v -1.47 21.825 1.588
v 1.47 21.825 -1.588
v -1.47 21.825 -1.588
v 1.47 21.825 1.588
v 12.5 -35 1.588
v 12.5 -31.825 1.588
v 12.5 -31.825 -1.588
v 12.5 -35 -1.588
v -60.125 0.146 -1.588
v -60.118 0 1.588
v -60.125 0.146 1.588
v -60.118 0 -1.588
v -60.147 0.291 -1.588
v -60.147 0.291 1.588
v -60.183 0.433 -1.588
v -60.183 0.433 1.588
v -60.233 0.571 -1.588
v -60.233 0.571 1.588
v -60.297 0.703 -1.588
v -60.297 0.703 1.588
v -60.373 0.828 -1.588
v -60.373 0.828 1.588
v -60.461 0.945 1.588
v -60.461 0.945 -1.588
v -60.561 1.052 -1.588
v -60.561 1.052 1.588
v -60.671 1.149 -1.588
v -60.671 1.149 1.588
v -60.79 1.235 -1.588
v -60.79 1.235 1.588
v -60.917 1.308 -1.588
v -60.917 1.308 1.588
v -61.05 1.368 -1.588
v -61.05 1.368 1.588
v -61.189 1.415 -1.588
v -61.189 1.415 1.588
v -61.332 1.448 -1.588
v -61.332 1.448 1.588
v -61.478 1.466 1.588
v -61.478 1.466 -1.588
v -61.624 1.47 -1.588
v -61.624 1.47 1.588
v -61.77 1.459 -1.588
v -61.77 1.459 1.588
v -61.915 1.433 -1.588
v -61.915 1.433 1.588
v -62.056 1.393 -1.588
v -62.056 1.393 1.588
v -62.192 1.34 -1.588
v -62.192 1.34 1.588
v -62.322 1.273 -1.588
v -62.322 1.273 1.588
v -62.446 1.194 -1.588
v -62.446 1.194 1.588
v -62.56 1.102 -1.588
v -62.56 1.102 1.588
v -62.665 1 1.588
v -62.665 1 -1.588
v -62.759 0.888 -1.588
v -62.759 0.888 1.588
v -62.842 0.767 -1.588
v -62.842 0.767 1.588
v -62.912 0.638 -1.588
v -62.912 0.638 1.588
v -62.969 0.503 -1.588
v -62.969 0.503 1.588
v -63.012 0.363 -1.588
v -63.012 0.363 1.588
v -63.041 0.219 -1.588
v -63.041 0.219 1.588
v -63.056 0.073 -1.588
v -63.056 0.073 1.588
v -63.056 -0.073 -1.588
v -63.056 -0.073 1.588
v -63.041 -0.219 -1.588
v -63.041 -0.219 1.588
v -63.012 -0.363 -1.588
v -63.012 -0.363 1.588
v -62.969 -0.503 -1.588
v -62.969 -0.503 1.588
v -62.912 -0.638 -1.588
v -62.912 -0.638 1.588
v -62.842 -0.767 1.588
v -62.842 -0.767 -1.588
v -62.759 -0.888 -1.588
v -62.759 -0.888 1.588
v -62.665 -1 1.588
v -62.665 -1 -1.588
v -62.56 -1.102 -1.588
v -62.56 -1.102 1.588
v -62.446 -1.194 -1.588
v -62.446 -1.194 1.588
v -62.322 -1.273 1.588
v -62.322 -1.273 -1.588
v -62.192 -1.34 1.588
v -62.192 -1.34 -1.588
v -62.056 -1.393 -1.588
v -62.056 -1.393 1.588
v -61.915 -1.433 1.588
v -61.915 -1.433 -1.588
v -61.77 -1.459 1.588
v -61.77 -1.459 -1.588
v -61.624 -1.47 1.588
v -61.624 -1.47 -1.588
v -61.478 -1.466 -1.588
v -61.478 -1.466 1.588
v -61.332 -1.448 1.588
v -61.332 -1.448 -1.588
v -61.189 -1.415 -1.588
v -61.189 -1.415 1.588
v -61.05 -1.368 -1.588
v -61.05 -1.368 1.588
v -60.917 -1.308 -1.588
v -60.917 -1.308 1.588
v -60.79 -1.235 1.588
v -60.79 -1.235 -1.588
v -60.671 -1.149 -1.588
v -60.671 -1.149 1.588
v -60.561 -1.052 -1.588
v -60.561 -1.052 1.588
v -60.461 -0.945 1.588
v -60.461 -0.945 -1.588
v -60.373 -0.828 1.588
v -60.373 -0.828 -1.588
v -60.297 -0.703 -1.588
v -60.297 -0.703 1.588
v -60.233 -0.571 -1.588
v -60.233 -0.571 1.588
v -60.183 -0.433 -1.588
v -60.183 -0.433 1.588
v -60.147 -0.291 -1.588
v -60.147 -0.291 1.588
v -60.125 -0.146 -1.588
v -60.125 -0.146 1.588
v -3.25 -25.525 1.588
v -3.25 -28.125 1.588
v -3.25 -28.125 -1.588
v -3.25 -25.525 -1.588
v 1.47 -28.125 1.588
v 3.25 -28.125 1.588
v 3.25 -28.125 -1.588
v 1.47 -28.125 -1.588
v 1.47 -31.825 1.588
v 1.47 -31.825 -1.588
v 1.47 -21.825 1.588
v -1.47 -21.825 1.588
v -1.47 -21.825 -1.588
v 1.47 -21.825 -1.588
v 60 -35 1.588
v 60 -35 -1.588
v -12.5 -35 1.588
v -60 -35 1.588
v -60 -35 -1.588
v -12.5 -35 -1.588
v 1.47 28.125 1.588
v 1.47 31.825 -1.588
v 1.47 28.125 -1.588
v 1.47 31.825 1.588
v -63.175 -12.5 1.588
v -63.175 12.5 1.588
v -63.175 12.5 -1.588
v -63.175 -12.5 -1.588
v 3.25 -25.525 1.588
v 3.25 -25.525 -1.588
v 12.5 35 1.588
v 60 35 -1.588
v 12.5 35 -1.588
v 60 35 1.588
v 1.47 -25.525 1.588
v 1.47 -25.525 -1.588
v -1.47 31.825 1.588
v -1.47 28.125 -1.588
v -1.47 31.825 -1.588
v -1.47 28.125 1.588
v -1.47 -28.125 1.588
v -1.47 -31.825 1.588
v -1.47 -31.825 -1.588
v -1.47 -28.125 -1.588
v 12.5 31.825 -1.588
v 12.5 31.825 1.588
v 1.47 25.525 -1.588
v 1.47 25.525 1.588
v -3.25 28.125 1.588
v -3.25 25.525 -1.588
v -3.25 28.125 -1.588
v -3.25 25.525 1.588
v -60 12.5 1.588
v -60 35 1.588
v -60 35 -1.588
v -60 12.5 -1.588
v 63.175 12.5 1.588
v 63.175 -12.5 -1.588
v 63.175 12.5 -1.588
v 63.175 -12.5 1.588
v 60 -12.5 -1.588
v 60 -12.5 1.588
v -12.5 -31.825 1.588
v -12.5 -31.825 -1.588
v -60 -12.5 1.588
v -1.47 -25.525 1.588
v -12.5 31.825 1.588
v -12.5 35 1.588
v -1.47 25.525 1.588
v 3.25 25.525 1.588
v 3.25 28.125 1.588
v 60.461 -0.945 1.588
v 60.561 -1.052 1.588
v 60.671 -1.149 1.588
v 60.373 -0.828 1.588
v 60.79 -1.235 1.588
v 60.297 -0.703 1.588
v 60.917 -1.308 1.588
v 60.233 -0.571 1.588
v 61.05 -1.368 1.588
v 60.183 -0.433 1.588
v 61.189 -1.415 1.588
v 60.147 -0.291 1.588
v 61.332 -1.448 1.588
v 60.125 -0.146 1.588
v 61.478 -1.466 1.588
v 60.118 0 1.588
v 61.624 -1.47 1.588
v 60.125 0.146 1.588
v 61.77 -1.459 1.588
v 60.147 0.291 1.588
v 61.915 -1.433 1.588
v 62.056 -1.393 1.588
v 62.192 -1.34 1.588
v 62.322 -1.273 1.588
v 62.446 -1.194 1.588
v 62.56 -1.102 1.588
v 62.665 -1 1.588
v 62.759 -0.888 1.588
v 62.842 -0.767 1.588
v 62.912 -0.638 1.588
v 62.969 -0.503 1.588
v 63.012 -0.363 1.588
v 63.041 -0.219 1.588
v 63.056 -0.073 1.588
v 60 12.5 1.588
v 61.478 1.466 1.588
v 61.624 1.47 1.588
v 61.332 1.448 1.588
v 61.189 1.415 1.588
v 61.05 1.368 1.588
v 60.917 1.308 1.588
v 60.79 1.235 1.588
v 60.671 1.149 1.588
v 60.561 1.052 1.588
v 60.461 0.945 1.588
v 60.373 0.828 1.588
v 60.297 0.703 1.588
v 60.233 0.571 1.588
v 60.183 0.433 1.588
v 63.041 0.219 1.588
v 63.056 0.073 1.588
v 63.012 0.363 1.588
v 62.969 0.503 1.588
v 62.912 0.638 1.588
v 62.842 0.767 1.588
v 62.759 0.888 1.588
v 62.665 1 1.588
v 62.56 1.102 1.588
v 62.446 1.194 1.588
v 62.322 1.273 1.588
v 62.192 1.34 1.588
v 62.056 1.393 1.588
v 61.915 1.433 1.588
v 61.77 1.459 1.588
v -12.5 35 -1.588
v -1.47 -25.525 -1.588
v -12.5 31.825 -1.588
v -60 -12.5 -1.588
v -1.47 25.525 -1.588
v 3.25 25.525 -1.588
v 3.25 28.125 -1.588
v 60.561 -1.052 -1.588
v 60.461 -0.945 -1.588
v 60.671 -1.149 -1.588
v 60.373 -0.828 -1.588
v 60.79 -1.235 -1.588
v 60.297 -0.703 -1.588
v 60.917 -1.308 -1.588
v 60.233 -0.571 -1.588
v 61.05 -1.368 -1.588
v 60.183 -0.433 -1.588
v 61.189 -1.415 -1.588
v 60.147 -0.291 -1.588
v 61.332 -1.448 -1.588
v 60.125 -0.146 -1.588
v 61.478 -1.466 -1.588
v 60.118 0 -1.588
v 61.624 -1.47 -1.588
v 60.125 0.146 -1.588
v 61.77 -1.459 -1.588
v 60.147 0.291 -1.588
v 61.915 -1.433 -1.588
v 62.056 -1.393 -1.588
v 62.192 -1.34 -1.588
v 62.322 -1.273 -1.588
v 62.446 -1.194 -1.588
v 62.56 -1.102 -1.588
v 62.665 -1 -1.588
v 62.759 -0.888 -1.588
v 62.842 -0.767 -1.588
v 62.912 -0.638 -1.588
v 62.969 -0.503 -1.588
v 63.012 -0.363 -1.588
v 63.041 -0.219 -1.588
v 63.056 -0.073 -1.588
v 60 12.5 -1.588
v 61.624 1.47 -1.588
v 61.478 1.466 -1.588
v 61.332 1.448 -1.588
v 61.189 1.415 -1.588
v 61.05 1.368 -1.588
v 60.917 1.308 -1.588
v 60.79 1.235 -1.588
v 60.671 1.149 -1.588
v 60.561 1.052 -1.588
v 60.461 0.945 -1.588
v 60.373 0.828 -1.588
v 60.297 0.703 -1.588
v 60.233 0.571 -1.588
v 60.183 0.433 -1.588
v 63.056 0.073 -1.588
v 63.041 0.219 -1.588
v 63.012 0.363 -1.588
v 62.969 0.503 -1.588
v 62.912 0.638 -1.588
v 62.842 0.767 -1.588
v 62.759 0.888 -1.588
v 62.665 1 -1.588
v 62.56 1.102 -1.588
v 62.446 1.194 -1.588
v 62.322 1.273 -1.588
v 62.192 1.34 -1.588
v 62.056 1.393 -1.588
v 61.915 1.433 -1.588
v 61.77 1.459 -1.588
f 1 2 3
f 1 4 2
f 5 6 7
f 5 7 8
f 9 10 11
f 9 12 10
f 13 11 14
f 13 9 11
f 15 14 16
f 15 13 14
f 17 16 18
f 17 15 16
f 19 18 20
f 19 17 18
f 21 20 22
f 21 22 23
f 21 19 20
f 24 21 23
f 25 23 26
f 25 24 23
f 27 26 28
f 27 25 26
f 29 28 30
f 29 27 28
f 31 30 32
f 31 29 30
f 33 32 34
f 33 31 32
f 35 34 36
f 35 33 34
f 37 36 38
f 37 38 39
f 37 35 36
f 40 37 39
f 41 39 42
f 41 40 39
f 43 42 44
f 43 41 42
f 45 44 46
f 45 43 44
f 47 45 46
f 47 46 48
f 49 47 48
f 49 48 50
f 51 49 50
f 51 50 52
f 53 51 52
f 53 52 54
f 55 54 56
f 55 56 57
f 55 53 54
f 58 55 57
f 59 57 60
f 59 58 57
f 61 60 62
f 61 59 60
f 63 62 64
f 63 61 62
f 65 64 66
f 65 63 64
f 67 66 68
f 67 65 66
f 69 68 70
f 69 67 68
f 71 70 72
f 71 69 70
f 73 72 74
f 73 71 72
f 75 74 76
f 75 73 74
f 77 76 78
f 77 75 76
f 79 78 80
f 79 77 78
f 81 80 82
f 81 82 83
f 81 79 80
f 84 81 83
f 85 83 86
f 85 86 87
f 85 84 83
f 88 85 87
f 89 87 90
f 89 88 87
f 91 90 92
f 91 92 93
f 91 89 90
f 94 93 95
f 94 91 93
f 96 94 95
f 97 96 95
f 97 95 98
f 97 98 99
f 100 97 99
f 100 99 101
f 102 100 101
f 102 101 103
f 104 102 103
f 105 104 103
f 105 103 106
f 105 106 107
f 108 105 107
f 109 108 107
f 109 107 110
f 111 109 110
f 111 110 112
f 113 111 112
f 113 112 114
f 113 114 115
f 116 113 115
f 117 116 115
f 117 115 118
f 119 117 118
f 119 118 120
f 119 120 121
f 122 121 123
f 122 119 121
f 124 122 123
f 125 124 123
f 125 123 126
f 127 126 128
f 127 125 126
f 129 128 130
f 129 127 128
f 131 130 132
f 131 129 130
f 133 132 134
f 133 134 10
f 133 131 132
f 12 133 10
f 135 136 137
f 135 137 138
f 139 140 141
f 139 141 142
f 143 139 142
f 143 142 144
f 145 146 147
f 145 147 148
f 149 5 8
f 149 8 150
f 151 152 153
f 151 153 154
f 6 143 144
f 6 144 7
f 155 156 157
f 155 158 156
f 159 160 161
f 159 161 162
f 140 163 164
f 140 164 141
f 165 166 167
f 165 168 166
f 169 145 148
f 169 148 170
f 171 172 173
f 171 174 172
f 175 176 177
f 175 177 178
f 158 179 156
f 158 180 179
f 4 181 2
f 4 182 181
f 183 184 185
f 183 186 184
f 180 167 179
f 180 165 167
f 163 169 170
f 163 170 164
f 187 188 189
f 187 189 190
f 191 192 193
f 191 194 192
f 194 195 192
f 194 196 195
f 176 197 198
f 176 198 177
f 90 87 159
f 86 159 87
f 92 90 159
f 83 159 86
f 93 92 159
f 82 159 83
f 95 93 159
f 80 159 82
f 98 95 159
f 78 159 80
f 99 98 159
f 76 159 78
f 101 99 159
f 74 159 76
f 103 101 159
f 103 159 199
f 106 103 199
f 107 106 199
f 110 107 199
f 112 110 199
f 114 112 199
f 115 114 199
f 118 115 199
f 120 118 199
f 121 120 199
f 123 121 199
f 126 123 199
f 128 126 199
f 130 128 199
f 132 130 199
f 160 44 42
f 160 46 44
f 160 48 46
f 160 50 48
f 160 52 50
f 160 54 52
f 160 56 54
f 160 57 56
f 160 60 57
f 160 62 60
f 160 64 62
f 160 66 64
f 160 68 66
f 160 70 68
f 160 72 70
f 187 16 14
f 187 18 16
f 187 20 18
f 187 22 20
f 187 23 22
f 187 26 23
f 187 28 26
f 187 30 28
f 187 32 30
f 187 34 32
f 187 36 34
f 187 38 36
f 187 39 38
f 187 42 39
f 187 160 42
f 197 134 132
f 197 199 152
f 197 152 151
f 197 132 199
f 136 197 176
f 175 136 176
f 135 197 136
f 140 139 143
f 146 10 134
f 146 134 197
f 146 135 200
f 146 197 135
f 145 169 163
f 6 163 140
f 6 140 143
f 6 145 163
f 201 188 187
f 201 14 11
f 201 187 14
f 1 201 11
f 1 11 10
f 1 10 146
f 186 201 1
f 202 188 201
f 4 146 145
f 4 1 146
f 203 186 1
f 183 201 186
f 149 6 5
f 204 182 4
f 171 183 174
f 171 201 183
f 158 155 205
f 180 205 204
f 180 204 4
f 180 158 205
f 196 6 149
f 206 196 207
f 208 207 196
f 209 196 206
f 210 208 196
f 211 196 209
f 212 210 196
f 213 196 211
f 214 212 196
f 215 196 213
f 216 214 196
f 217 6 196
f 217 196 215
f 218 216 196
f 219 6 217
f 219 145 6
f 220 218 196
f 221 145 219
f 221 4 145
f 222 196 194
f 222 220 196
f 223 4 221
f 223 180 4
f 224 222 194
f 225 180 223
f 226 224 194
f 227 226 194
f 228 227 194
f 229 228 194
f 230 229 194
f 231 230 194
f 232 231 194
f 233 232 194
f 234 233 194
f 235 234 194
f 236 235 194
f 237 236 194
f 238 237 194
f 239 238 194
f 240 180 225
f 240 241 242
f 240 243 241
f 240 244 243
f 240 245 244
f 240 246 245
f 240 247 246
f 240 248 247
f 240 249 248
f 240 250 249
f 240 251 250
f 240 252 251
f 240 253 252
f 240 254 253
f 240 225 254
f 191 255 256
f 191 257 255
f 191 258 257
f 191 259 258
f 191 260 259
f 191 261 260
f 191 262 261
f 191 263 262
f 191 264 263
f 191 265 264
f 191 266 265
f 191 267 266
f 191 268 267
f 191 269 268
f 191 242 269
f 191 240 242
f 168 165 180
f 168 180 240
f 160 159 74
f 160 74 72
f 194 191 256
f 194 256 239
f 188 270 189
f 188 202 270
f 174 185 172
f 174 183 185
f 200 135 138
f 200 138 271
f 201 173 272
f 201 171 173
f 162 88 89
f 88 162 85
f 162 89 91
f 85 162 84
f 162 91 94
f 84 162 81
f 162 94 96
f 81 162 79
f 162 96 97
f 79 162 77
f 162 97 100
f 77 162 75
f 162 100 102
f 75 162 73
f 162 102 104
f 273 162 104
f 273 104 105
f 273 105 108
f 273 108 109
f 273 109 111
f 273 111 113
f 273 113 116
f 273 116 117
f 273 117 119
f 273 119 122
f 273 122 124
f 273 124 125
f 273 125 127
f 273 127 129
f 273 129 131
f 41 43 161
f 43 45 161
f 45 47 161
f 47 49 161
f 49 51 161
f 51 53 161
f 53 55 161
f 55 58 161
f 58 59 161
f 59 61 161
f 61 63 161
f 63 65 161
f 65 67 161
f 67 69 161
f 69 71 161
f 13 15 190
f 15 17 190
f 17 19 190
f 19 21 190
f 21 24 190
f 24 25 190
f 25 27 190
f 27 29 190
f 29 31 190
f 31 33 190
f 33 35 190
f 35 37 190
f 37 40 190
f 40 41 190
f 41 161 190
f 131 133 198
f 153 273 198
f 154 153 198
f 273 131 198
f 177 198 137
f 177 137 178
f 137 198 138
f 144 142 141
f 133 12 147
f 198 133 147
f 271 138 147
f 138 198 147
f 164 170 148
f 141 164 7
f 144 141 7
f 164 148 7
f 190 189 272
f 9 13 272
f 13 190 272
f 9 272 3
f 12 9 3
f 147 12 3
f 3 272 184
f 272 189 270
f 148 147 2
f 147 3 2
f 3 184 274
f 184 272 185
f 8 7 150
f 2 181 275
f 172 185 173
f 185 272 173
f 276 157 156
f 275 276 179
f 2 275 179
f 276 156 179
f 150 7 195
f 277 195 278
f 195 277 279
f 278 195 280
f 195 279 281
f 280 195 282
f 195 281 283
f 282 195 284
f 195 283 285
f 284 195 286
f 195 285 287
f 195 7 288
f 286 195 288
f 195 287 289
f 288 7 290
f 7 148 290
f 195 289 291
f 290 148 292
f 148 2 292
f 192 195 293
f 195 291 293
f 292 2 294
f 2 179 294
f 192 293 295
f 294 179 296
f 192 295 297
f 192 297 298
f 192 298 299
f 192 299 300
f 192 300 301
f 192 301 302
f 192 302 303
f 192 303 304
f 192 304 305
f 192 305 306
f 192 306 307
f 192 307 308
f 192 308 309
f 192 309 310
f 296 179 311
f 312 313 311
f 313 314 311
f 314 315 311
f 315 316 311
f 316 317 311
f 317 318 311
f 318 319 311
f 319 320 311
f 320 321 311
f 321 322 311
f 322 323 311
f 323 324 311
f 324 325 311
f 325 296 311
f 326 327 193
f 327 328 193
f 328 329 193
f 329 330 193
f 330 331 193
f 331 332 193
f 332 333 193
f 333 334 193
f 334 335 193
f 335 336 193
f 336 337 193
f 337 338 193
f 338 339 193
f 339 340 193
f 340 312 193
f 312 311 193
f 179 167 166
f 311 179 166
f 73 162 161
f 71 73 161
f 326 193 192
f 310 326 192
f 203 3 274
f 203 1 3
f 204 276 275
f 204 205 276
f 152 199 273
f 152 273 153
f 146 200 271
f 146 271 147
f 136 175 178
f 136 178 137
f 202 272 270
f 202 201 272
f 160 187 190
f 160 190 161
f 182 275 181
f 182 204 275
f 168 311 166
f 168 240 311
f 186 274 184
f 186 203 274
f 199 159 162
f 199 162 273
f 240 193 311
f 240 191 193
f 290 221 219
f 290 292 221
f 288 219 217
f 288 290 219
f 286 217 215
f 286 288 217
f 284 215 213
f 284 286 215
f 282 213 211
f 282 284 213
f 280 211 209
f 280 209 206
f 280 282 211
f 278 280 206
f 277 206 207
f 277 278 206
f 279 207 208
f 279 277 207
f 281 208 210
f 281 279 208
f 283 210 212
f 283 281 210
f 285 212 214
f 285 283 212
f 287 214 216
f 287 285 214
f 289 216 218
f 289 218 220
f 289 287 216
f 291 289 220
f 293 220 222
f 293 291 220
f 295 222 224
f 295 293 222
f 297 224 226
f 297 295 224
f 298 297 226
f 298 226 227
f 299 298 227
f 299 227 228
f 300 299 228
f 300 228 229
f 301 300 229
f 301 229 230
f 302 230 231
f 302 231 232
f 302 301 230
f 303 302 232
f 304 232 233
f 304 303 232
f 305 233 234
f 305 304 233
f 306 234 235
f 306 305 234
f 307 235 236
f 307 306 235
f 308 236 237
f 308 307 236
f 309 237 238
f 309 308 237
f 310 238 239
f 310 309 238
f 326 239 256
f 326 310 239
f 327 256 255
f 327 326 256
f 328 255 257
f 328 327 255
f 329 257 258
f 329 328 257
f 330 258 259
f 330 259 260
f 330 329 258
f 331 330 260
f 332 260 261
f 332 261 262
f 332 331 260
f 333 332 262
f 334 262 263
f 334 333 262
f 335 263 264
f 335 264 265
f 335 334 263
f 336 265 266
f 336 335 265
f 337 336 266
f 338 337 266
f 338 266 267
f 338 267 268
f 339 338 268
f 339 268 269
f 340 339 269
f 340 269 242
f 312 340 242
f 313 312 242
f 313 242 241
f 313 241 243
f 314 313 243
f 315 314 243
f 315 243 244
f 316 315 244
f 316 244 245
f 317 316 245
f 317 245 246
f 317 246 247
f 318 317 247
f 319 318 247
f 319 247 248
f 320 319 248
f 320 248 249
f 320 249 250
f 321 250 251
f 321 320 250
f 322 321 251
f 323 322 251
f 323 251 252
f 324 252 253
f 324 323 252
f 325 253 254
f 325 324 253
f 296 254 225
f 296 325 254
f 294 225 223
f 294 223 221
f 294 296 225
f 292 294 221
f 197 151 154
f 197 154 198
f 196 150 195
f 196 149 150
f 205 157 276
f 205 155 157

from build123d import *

# Parameters (mm, degrees)
SKETCH1_R           = 1.47
BOSS_EXTRUDE1_DEPTH = 1.5875


with BuildPart() as part:
    # Sketch1 → Boss-Extrude1 (new, symmetric)
    with BuildSketch(Plane.XY):
        Polygon((-12.5, 35), (-60, 35), (-60, 12.5), (-63.175, 12.5), (-63.175, -12.5), (-60, -12.5), (-60, -35), (-12.5, -35), (-12.5, -31.825), (-1.47, -31.825), (-1.47, -28.125), (-3.25, -28.125), (-3.25, -25.525), (-1.47, -25.525), (-1.47, -21.825), (1.47, -21.825), (1.47, -25.525), (3.25, -25.525), (3.25, -28.125), (1.47, -28.125), (1.47, -31.825), (12.5, -31.825), (12.5, -35), (60, -35), (60, -12.5), (63.175, -12.5), (63.175, 12.5), (60, 12.5), (60, 35), (12.5, 35), (12.5, 31.825), (1.47, 31.825), (1.47, 28.125), (3.25, 28.125), (3.25, 25.525), (1.47, 25.525), (1.47, 21.825), (-1.47, 21.825), (-1.47, 25.525), (-3.25, 25.525), (-3.25, 28.125), (-1.47, 28.125), (-1.47, 31.825), (-12.5, 31.825), align=None)
        with Locations((-61.5875, 0)):
            Circle(SKETCH1_R, mode=Mode.SUBTRACT)
        with Locations(Location((61.5875, 0, 0), (0, 0, 180))):
            Circle(SKETCH1_R, mode=Mode.SUBTRACT)
    extrude(amount=BOSS_EXTRUDE1_DEPTH, both=True)


solid = part.part
